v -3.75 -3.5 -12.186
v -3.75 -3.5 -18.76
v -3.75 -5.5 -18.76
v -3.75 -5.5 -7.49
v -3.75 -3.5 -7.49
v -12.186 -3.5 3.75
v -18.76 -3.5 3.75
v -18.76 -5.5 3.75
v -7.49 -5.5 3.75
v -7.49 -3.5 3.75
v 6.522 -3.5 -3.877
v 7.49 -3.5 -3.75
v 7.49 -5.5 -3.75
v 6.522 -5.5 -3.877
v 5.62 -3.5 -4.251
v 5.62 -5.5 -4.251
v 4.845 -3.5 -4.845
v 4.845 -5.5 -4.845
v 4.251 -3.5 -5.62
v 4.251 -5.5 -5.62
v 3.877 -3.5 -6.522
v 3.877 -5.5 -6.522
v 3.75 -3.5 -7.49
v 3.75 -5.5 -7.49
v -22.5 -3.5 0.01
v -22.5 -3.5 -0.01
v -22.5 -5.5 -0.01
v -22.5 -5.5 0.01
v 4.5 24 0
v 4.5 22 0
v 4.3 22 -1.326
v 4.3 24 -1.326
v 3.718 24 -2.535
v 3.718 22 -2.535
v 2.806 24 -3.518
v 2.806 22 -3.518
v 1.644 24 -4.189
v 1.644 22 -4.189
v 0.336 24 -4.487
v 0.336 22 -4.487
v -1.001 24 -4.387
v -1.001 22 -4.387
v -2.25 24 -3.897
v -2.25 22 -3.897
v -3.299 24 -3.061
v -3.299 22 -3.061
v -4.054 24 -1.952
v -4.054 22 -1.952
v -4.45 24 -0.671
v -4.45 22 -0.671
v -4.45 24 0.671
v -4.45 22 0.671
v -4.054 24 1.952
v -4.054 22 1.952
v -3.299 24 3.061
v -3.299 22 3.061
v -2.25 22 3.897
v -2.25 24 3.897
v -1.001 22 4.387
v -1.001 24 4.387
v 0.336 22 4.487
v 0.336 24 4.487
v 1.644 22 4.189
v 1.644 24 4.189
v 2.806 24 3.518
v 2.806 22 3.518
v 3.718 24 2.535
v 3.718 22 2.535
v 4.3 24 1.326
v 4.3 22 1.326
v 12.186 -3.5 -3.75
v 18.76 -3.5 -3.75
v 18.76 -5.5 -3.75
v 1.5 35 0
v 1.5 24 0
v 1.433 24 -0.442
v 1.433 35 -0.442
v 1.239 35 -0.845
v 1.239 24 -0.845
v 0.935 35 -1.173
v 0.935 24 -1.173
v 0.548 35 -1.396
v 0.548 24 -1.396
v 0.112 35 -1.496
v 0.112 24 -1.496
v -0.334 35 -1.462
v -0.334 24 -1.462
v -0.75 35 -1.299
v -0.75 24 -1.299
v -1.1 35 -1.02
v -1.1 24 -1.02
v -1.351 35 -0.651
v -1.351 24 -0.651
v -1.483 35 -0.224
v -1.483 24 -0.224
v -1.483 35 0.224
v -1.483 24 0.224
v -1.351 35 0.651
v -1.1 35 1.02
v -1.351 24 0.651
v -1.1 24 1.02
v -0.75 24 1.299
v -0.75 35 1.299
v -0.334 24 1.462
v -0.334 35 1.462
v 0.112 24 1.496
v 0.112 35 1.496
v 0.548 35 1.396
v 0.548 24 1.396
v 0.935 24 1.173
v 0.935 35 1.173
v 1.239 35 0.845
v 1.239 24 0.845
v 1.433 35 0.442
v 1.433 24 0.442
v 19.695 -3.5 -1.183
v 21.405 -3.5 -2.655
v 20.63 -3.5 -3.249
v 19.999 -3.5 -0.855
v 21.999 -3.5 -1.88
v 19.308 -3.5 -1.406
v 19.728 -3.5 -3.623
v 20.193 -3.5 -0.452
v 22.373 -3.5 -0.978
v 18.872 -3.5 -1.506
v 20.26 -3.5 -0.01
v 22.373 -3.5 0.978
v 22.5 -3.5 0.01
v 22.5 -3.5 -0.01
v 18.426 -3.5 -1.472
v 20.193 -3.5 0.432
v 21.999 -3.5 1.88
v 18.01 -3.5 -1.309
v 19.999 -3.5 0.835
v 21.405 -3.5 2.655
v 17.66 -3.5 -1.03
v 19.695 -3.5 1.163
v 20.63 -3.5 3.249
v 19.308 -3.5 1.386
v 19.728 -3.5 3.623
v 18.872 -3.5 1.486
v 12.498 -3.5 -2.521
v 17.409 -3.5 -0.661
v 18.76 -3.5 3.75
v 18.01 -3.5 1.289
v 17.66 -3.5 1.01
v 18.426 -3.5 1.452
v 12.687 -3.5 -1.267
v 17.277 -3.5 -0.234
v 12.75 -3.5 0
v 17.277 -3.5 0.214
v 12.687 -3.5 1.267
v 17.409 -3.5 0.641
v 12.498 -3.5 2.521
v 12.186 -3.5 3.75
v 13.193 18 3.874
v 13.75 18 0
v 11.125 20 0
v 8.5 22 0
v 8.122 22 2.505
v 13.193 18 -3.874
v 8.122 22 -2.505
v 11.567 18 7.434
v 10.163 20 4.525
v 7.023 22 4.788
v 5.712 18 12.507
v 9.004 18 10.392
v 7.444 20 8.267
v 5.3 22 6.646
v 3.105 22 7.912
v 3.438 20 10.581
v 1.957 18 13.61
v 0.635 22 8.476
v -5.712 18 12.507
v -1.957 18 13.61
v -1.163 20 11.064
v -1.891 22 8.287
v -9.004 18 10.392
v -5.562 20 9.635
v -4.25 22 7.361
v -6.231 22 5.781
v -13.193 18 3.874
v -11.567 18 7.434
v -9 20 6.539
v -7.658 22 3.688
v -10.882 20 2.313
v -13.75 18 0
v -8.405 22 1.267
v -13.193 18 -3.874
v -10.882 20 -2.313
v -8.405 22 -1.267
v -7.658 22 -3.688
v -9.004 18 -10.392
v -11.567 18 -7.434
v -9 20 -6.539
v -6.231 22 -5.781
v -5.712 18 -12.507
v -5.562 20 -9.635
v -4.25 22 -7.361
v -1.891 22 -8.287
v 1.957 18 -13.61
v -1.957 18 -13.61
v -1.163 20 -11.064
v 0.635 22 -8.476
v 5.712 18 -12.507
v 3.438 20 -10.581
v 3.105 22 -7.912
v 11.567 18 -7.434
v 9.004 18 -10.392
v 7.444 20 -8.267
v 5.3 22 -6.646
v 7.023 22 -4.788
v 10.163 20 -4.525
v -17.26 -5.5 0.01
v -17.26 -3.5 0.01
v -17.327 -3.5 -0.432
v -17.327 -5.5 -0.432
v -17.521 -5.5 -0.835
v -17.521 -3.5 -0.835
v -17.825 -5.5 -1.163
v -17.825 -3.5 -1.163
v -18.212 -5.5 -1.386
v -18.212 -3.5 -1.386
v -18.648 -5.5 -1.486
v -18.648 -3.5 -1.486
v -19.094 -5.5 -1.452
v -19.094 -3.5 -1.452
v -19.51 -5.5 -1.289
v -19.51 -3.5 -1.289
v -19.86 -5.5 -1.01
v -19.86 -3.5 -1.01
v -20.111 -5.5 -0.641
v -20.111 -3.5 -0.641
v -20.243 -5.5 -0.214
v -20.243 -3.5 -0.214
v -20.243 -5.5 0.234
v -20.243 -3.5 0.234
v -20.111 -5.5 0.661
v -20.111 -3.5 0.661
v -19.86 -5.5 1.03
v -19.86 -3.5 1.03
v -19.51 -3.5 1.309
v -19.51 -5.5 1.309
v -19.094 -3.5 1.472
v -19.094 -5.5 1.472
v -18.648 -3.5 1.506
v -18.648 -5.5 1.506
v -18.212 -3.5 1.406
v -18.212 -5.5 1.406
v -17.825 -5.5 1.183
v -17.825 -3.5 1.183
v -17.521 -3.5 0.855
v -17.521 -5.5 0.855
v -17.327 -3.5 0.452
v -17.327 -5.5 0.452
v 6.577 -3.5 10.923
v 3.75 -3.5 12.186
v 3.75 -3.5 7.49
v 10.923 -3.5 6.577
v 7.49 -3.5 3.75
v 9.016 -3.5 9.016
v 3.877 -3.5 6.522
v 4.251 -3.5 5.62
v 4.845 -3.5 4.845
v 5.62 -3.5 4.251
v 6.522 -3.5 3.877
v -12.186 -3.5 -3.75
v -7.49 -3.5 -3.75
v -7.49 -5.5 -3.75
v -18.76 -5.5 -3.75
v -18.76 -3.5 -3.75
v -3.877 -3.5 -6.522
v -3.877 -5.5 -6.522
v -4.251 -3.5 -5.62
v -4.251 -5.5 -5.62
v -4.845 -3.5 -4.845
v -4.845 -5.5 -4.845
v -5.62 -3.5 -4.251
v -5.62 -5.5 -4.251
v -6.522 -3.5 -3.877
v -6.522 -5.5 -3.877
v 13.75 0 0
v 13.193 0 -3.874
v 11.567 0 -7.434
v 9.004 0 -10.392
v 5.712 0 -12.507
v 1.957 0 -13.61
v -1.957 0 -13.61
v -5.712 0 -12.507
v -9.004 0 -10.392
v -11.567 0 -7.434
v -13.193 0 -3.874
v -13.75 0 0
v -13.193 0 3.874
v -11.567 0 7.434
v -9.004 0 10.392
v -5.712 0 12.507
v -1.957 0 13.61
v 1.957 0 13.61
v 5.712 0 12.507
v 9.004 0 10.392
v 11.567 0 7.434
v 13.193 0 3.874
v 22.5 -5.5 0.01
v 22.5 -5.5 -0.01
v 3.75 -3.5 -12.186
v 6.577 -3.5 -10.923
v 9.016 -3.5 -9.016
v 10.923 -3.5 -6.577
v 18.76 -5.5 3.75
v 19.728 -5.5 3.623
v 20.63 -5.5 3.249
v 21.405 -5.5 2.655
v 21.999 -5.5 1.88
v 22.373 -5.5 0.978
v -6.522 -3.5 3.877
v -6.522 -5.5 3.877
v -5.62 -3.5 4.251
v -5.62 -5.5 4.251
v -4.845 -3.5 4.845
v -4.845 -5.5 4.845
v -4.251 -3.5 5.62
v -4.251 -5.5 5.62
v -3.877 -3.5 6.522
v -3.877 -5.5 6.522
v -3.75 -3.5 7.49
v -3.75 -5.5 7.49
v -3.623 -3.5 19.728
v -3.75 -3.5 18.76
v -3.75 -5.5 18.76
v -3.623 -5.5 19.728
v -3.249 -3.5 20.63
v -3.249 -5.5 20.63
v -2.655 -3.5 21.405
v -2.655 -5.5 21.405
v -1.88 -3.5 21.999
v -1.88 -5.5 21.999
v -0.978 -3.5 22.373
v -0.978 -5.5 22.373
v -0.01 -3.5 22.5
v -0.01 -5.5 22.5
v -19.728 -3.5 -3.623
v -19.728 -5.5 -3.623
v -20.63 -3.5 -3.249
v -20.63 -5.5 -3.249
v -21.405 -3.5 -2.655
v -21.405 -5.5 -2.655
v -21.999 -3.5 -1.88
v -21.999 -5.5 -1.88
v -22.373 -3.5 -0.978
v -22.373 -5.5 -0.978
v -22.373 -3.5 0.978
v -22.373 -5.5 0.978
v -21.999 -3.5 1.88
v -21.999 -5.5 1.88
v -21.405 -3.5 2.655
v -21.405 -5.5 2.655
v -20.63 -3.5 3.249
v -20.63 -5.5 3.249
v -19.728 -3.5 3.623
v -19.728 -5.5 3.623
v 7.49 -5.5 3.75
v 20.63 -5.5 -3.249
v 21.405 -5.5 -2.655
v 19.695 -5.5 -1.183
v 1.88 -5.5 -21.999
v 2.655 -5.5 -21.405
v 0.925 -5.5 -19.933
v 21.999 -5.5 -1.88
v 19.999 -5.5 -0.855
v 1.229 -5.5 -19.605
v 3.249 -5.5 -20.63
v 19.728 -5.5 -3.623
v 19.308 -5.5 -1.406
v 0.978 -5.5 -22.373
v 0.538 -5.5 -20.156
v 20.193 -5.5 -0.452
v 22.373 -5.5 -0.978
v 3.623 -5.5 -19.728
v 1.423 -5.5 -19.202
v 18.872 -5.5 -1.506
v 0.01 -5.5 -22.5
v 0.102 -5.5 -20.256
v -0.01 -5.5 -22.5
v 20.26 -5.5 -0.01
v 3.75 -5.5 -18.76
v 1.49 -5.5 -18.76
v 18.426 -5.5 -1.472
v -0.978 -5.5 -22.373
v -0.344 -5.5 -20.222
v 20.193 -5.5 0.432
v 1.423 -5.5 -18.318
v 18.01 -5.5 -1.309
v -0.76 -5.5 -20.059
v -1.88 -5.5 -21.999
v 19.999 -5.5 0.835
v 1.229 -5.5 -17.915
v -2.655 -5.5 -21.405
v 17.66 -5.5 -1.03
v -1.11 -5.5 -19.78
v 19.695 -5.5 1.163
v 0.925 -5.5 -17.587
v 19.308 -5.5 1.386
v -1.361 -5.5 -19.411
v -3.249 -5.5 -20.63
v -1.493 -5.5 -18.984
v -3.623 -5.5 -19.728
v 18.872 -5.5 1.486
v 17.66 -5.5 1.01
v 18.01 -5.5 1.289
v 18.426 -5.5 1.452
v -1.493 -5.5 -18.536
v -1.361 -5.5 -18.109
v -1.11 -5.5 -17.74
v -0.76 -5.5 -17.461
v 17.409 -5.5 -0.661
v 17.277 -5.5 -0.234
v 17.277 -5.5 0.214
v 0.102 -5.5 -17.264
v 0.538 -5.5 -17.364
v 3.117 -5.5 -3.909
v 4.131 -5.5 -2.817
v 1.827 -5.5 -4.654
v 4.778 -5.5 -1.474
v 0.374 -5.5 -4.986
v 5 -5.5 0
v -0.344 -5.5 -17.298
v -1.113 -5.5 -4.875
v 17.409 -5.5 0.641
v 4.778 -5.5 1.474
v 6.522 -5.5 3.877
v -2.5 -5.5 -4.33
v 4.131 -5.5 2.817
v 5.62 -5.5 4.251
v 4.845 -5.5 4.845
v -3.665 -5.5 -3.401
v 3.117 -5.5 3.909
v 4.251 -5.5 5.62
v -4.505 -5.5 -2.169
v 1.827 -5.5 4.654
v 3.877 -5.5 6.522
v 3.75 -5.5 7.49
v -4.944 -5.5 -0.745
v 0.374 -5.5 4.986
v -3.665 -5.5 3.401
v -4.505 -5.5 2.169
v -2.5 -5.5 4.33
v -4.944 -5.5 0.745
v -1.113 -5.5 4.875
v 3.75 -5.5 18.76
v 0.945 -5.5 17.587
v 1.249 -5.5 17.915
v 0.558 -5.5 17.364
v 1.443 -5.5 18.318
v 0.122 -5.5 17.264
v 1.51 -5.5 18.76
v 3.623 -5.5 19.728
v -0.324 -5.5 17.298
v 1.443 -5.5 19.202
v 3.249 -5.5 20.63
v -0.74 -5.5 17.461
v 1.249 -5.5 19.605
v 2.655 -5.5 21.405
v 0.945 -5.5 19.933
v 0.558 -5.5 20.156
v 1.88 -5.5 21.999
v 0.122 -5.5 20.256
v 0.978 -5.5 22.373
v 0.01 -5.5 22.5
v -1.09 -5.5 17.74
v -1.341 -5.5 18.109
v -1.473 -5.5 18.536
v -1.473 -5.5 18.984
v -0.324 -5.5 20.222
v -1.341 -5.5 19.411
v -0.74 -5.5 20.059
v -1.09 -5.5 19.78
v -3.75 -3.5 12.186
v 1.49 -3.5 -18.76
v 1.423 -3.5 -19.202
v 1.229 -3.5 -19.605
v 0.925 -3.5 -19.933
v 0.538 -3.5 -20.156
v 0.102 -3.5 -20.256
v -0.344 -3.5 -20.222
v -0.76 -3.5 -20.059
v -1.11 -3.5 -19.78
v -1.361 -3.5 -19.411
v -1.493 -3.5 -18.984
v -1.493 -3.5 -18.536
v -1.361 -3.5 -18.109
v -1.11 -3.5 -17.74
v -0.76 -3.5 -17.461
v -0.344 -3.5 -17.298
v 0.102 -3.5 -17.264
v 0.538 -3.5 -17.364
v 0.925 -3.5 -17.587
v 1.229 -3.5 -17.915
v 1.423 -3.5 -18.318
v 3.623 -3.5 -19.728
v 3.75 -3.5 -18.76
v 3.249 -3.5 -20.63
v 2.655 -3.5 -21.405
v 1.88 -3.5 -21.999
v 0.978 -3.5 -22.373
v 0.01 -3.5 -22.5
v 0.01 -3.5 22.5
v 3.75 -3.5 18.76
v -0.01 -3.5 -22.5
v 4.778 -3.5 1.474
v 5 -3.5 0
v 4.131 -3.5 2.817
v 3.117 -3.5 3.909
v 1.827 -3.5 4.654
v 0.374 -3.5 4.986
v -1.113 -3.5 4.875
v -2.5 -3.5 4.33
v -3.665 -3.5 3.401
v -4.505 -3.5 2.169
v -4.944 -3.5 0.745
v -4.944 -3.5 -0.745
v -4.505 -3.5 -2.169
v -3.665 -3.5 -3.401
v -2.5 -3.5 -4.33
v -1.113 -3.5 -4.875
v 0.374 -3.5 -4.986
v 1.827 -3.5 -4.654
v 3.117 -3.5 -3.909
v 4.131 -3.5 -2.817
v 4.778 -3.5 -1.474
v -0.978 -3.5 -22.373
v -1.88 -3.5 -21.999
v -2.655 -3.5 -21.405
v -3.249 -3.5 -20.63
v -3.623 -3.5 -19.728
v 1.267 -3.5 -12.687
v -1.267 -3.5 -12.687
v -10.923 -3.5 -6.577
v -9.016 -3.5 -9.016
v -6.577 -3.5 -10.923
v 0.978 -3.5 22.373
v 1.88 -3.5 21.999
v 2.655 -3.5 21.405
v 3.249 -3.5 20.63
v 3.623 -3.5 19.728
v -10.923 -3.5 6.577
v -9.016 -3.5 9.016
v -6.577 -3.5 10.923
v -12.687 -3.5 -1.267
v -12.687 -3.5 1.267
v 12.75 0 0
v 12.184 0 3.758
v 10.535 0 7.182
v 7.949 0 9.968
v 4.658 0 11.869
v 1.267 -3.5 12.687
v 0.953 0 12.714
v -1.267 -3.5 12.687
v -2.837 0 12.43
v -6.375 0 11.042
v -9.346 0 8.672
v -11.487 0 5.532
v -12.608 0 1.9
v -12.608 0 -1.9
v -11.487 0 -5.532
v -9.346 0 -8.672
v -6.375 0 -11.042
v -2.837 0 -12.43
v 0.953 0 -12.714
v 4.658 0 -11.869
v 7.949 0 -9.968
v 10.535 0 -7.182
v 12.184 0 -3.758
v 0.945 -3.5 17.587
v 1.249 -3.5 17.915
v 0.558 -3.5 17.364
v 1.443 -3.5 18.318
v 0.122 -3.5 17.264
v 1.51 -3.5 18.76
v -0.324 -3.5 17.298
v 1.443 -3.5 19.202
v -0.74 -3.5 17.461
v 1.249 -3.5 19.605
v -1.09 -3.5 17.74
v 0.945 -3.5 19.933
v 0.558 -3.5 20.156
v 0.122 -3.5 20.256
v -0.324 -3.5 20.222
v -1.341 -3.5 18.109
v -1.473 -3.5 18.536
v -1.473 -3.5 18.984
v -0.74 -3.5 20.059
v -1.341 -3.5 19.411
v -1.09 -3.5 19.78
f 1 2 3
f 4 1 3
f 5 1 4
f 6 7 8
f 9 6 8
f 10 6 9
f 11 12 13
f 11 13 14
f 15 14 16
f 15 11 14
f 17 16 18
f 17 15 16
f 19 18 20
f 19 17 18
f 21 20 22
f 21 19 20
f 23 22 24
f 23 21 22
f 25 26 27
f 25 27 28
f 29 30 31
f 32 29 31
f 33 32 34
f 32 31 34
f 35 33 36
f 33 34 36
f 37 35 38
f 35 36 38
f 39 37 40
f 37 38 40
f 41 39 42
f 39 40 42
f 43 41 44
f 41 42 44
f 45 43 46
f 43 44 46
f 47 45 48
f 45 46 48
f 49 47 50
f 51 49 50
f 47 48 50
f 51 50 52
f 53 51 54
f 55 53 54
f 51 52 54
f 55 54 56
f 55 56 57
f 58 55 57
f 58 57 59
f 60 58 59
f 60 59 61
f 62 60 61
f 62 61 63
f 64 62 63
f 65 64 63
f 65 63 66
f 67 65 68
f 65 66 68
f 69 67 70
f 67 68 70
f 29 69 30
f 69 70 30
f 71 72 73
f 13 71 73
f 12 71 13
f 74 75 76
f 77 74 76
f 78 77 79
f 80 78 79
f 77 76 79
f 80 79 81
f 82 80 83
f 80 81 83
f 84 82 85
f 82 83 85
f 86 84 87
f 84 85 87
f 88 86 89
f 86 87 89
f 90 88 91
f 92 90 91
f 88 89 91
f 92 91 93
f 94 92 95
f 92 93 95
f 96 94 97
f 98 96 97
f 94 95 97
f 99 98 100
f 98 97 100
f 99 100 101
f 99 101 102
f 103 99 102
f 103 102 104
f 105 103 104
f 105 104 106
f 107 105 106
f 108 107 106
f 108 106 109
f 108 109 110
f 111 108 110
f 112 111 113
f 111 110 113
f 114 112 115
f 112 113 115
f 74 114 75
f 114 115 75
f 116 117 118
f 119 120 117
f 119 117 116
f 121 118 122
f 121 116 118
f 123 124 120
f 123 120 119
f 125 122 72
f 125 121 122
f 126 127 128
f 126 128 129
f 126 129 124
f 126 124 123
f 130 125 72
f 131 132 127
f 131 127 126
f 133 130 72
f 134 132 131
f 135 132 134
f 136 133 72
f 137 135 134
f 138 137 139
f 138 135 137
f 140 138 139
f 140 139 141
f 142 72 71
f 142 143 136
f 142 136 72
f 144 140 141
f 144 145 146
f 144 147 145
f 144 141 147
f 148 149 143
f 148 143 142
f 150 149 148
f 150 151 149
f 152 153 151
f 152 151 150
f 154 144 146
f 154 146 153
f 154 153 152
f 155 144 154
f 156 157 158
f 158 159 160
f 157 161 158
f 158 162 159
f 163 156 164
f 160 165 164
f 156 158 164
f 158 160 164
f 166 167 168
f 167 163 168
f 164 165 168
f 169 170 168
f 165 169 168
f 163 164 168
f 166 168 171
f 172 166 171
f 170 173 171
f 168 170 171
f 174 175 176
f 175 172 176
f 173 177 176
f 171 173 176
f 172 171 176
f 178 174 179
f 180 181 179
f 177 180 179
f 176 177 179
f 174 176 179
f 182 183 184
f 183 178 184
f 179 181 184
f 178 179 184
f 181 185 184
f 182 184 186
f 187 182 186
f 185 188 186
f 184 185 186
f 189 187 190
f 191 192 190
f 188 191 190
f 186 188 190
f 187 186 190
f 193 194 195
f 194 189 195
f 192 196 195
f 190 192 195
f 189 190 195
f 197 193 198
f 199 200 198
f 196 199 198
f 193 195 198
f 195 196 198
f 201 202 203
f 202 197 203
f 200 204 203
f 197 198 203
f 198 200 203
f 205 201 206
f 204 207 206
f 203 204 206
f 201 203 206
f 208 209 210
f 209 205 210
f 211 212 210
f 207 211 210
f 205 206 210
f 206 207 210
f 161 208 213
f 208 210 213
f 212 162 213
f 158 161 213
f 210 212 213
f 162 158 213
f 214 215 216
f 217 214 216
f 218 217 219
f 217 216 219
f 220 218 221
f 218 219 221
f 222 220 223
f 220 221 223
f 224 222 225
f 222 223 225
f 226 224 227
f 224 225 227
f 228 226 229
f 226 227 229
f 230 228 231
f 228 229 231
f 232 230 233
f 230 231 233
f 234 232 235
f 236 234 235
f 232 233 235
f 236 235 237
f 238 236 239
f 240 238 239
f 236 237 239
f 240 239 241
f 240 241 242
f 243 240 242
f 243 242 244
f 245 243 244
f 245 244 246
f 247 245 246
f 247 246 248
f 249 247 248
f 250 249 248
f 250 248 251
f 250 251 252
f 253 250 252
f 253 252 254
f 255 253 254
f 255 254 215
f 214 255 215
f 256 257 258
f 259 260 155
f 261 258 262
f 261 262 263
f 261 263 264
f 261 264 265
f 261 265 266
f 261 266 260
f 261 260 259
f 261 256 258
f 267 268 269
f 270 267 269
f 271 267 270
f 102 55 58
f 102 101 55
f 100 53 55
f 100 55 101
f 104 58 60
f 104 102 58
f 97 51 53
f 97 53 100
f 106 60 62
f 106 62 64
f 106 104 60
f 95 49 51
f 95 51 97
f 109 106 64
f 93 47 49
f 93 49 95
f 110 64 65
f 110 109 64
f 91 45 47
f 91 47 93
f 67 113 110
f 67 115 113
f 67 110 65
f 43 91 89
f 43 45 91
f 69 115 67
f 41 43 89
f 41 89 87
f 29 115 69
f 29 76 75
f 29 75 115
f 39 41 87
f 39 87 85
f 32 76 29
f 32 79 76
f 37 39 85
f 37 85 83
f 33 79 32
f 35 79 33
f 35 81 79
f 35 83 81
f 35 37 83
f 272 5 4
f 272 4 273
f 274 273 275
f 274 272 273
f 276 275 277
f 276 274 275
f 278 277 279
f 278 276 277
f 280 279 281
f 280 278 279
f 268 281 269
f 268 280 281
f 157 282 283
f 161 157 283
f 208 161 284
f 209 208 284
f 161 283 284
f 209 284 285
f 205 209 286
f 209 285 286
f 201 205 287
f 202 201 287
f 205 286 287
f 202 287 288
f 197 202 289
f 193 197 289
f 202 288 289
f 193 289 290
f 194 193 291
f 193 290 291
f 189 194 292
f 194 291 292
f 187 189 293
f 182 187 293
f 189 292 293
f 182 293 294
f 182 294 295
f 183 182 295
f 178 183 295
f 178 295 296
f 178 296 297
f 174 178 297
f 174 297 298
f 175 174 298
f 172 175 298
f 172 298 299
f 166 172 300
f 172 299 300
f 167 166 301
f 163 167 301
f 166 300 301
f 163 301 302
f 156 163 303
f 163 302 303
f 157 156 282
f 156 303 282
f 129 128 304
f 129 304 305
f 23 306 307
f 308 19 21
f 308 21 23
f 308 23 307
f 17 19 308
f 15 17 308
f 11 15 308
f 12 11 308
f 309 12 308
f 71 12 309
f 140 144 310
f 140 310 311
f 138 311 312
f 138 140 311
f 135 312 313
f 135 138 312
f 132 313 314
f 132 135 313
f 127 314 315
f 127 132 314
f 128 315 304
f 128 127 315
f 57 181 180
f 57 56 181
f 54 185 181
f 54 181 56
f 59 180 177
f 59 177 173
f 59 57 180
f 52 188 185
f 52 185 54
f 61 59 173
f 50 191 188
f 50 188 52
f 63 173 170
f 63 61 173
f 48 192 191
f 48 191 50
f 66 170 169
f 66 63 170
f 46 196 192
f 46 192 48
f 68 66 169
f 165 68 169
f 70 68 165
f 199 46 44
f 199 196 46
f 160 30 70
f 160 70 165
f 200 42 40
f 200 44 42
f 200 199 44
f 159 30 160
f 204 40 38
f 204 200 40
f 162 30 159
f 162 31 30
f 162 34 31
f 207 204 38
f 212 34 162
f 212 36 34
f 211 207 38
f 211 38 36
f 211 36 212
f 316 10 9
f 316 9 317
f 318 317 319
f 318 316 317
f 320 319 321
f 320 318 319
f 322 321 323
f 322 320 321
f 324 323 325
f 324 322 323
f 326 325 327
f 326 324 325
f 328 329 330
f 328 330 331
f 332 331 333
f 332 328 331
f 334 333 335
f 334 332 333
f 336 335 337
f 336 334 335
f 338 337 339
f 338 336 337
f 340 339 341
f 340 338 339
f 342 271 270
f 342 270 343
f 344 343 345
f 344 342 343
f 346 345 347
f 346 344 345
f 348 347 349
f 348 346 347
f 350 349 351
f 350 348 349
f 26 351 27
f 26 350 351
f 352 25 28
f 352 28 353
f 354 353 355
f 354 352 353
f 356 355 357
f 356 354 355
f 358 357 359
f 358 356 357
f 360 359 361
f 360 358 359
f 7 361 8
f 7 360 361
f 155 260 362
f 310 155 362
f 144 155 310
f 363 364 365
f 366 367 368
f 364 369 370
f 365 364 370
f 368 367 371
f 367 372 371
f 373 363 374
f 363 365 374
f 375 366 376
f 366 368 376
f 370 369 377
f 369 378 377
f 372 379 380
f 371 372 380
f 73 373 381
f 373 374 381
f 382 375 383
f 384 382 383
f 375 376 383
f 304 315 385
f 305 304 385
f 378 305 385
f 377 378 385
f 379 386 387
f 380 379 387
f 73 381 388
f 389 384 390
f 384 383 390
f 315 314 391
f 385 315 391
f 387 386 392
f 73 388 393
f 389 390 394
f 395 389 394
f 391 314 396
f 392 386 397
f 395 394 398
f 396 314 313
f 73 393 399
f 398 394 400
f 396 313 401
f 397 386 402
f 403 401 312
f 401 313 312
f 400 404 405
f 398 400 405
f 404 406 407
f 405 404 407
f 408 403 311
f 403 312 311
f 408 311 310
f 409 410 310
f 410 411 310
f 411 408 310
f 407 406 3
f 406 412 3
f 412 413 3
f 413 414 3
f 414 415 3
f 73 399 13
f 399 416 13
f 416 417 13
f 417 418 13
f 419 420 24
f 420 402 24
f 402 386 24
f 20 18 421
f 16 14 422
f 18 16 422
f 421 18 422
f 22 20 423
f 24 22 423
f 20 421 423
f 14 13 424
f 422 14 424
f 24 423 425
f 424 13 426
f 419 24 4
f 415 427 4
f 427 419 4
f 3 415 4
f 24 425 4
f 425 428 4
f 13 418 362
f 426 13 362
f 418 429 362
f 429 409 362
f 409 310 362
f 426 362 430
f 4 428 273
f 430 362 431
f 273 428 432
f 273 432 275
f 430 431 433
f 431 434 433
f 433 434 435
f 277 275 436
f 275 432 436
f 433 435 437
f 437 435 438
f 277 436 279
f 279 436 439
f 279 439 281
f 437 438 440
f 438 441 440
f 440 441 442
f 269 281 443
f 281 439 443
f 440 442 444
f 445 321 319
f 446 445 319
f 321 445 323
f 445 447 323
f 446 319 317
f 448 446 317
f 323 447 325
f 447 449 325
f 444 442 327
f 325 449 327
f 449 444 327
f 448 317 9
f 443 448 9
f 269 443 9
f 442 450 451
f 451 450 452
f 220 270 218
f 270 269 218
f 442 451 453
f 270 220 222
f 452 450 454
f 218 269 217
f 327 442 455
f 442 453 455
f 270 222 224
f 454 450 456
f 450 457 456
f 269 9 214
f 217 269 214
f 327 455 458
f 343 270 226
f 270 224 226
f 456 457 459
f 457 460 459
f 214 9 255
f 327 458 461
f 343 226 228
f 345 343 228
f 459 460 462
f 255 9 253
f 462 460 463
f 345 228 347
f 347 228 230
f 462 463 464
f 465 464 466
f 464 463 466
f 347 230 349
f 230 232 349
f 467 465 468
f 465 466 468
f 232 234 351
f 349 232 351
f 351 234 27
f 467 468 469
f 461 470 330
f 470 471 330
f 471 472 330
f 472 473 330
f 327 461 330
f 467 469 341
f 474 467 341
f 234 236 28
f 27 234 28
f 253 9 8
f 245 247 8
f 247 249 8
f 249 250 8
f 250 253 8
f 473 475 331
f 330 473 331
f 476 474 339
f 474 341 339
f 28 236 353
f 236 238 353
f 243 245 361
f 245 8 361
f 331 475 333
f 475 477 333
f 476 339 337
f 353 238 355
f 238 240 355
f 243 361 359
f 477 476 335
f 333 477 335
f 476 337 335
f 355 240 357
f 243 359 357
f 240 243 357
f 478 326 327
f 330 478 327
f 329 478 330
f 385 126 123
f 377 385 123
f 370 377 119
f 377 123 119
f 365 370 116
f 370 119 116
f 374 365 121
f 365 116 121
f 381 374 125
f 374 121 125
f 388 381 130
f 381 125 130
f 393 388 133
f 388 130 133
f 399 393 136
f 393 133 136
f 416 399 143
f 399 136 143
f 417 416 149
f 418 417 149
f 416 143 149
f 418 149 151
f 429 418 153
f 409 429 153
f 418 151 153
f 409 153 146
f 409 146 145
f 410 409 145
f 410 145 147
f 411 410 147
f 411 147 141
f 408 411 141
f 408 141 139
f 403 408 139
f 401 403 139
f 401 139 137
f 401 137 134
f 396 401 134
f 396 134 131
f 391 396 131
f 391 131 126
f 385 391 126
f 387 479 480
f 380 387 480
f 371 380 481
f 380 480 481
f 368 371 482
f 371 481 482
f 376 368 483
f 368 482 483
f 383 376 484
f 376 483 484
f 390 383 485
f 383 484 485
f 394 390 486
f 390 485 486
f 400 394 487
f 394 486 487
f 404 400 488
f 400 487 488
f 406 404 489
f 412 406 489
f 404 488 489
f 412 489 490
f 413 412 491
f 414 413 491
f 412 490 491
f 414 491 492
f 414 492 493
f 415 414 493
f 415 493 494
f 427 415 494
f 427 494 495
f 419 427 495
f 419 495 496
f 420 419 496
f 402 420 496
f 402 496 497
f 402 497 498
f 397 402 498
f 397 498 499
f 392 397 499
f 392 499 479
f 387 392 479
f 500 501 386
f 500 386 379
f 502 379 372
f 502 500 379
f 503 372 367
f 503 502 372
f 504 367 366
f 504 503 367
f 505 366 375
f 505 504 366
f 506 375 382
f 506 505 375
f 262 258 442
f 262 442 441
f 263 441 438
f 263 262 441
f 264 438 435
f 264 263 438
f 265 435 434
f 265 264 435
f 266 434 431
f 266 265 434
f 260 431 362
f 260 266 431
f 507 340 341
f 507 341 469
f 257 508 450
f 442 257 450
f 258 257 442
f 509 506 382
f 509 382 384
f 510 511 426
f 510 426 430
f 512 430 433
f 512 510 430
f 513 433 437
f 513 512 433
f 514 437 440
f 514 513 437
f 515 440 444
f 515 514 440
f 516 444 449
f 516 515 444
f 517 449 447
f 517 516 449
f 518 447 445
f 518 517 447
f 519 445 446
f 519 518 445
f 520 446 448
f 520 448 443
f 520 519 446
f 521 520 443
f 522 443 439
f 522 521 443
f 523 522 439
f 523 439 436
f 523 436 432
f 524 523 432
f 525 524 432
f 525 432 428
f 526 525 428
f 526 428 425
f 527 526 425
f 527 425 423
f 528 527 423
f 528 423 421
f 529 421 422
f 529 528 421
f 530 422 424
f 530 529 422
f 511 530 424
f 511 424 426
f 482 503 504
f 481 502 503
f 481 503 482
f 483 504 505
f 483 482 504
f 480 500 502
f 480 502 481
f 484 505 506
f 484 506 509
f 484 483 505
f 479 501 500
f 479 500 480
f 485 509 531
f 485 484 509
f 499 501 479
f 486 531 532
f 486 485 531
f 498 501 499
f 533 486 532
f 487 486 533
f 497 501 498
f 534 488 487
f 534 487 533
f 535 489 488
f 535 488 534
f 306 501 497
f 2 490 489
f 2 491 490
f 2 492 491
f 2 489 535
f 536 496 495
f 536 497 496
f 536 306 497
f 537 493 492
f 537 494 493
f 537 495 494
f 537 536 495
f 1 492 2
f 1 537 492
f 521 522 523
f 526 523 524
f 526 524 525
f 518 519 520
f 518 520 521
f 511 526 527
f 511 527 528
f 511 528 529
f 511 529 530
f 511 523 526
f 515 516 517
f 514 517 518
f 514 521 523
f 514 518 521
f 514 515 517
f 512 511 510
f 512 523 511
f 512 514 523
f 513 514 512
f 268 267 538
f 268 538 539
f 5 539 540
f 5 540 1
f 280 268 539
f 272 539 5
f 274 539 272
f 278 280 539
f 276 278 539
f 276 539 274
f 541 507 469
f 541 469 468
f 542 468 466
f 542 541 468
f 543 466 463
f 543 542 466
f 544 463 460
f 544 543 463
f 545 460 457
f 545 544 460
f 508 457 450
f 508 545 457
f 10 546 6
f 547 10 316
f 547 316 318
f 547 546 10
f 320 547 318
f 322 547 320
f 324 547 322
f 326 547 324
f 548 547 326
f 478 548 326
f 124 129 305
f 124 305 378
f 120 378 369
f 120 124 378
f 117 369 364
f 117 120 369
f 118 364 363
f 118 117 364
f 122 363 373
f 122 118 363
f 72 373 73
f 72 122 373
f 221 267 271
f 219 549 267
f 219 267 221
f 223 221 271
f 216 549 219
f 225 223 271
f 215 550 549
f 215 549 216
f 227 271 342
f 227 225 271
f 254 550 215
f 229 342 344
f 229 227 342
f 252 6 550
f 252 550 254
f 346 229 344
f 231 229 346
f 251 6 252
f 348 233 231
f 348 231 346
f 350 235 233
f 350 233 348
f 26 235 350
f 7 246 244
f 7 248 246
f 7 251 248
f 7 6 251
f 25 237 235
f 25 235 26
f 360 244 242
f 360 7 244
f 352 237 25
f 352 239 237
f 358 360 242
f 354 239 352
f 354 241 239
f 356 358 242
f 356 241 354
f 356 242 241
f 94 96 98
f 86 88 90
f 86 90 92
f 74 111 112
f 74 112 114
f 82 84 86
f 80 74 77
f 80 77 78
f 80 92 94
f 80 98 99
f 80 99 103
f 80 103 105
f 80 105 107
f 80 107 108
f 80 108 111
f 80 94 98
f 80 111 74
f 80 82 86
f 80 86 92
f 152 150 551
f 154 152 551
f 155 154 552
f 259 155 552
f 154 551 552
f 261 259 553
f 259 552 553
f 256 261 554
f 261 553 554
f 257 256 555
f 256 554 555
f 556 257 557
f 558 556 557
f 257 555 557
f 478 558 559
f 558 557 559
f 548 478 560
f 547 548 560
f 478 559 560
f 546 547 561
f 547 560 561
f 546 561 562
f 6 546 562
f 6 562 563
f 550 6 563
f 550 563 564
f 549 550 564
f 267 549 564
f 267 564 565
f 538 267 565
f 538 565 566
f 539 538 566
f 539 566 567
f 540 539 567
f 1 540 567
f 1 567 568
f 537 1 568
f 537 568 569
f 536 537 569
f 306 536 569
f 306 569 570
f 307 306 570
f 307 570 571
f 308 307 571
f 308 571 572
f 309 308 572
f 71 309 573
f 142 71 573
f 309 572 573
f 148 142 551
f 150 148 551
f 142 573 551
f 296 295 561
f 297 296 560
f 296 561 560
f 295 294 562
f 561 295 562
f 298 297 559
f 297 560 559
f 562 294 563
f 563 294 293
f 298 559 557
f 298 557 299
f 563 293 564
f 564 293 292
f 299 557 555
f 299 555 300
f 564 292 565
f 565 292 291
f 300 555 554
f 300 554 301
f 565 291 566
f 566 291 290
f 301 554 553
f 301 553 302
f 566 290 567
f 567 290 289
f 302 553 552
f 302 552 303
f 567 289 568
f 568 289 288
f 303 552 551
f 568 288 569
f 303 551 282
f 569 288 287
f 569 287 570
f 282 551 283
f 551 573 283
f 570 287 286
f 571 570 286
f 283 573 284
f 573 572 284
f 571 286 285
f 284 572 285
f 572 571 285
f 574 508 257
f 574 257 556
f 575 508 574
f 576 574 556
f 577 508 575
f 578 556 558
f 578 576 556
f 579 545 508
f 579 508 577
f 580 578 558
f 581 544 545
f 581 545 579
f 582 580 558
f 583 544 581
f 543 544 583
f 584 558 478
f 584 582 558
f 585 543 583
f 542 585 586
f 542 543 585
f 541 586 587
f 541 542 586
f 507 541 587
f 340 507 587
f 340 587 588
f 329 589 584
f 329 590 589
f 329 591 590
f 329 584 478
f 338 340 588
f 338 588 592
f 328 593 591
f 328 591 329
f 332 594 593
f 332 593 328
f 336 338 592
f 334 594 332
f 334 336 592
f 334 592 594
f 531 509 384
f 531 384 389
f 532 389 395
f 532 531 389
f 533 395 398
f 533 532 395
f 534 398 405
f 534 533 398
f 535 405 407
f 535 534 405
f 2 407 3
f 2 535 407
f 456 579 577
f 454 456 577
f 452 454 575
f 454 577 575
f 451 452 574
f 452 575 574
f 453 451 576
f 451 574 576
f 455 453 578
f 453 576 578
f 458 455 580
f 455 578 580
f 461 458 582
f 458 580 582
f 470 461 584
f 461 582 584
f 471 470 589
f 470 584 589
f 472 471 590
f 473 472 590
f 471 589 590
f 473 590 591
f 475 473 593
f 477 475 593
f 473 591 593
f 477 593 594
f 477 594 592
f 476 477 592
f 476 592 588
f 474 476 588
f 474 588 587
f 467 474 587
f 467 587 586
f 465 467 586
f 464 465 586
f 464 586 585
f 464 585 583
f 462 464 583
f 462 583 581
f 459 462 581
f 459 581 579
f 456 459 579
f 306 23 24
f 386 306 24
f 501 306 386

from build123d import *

# Parameters (mm, degrees)
CROQUIS1_R                       = 13.75
SALIENTE_EXTRUIR1_DEPTH          = 18
CROQUIS3_R                       = 8.5
SALIENTE_EXTRUIR2_DEPTH          = 4
CROQUIS4_R                       = 4.5
SALIENTE_EXTRUIR3_DEPTH          = 2
CROQUIS5_R                       = 1.5
SALIENTE_EXTRUIR4_DEPTH          = 11
CROQUIS7_R                       = 12.75
SALIENTE_EXTRUIR5_DEPTH          = 3.5
CROQUIS8_R                       = 5
SALIENTE_EXTRUIR6_DEPTH          = 2
TALADRO_DE_MARGEN_PARA_M11_D     = 3
TALADRO_DE_MARGEN_PARA_M11_DEPTH = 5


with BuildPart() as part:
    # Croquis1 → Saliente-Extruir1 (new body)
    with BuildSketch(Plane(origin=(0, 0, 0), x_dir=(1, 0, 0), z_dir=(0, 1, 0))):
        Circle(CROQUIS1_R)
    extrude(amount=SALIENTE_EXTRUIR1_DEPTH)

    # Croquis3 → Saliente-Extruir2 (add)
    with BuildSketch(Plane(origin=(0, 18, 0), x_dir=(1, 0, 0), z_dir=(0, 1, 0))):
        Circle(CROQUIS3_R)
    extrude(amount=SALIENTE_EXTRUIR2_DEPTH)

    # Croquis4 → Saliente-Extruir3 (add)
    with BuildSketch(Plane(origin=(0, 22, 0), x_dir=(1, 0, 0), z_dir=(0, 1, 0))):
        Circle(CROQUIS4_R)
    extrude(amount=SALIENTE_EXTRUIR3_DEPTH)

    # Croquis5 → Saliente-Extruir4 (add)
    with BuildSketch(Plane(origin=(0, 24, 0), x_dir=(1, 0, 0), z_dir=(0, 1, 0))):
        Circle(CROQUIS5_R)
    extrude(amount=SALIENTE_EXTRUIR4_DEPTH)

    # Croquis6 → Revolución1 (revolve)
    with BuildSketch(Plane.XY):
        Polygon((13.75, 18), (8.5, 22), (8.5, 18), align=None)
    revolve(axis=Axis((0, 18, 0), (0, -1, 0)))

    # Croquis7 → Saliente-Extruir5 (add)
    with BuildSketch(Plane.XZ):
        Circle(CROQUIS7_R)
    extrude(amount=SALIENTE_EXTRUIR5_DEPTH)

    # Croquis8 → Saliente-Extruir6 (add)
    with BuildSketch(Plane.XZ.offset(3.5)):
        with BuildLine():
            Line((7.49, 3.75), (18.76, 3.75))
            ThreePointArc((18.76, 3.75), (21.404579362, 2.654579362), (22.5, 0.01))
            Line((22.5, 0.01), (22.5, -0.01))
            ThreePointArc((22.5, -0.01), (21.404579362, -2.654579362), (18.76, -3.75))
            Line((18.76, -3.75), (7.49, -3.75))
            ThreePointArc((7.49, -3.75), (4.845420638, -4.845420638), (3.75, -7.49))
            Line((3.75, -7.49), (3.75, -18.76))
            ThreePointArc((3.75, -18.76), (2.654579362, -21.404579362), (0.01, -22.5))
            Line((0.01, -22.5), (-0.01, -22.5))
            ThreePointArc((-0.01, -22.5), (-2.654579362, -21.404579362), (-3.75, -18.76))
            Line((-3.75, -18.76), (-3.75, -7.49))
            ThreePointArc((-3.75, -7.49), (-4.845420638, -4.845420638), (-7.49, -3.75))
            Line((-7.49, -3.75), (-18.76, -3.75))
            ThreePointArc((-18.76, -3.75), (-21.404579362, -2.654579362), (-22.5, -0.01))
            Line((-22.5, -0.01), (-22.5, 0.01))
            ThreePointArc((-22.5, 0.01), (-21.404579362, 2.654579362), (-18.76, 3.75))
            Line((-18.76, 3.75), (-7.49, 3.75))
            ThreePointArc((-7.49, 3.75), (-4.845420638, 4.845420638), (-3.75, 7.49))
            Line((-3.75, 7.49), (-3.75, 18.76))
            ThreePointArc((-3.75, 18.76), (-2.654579362, 21.404579362), (-0.01, 22.5))
            Line((-0.01, 22.5), (0.01, 22.5))
            ThreePointArc((0.01, 22.5), (2.654579362, 21.404579362), (3.75, 18.76))
            Line((3.75, 18.76), (3.75, 7.49))
            ThreePointArc((3.75, 7.49), (4.845420638, 4.845420638), (7.49, 3.75))
        make_face()
        Circle(CROQUIS8_R, mode=Mode.SUBTRACT)
    extrude(amount=SALIENTE_EXTRUIR6_DEPTH)

    # Taladro de margen para M11
    with Locations(Plane(origin=(0, -5.5, 0), x_dir=(-1, 0, 0), z_dir=(0, -1, 0))):
        with Locations((0.01, 18.76), (-18.76, 0.01), (-0.01, -18.76), (18.76, -0.01)):
            Hole(TALADRO_DE_MARGEN_PARA_M11_D / 2, depth=TALADRO_DE_MARGEN_PARA_M11_DEPTH)


solid = part.part
